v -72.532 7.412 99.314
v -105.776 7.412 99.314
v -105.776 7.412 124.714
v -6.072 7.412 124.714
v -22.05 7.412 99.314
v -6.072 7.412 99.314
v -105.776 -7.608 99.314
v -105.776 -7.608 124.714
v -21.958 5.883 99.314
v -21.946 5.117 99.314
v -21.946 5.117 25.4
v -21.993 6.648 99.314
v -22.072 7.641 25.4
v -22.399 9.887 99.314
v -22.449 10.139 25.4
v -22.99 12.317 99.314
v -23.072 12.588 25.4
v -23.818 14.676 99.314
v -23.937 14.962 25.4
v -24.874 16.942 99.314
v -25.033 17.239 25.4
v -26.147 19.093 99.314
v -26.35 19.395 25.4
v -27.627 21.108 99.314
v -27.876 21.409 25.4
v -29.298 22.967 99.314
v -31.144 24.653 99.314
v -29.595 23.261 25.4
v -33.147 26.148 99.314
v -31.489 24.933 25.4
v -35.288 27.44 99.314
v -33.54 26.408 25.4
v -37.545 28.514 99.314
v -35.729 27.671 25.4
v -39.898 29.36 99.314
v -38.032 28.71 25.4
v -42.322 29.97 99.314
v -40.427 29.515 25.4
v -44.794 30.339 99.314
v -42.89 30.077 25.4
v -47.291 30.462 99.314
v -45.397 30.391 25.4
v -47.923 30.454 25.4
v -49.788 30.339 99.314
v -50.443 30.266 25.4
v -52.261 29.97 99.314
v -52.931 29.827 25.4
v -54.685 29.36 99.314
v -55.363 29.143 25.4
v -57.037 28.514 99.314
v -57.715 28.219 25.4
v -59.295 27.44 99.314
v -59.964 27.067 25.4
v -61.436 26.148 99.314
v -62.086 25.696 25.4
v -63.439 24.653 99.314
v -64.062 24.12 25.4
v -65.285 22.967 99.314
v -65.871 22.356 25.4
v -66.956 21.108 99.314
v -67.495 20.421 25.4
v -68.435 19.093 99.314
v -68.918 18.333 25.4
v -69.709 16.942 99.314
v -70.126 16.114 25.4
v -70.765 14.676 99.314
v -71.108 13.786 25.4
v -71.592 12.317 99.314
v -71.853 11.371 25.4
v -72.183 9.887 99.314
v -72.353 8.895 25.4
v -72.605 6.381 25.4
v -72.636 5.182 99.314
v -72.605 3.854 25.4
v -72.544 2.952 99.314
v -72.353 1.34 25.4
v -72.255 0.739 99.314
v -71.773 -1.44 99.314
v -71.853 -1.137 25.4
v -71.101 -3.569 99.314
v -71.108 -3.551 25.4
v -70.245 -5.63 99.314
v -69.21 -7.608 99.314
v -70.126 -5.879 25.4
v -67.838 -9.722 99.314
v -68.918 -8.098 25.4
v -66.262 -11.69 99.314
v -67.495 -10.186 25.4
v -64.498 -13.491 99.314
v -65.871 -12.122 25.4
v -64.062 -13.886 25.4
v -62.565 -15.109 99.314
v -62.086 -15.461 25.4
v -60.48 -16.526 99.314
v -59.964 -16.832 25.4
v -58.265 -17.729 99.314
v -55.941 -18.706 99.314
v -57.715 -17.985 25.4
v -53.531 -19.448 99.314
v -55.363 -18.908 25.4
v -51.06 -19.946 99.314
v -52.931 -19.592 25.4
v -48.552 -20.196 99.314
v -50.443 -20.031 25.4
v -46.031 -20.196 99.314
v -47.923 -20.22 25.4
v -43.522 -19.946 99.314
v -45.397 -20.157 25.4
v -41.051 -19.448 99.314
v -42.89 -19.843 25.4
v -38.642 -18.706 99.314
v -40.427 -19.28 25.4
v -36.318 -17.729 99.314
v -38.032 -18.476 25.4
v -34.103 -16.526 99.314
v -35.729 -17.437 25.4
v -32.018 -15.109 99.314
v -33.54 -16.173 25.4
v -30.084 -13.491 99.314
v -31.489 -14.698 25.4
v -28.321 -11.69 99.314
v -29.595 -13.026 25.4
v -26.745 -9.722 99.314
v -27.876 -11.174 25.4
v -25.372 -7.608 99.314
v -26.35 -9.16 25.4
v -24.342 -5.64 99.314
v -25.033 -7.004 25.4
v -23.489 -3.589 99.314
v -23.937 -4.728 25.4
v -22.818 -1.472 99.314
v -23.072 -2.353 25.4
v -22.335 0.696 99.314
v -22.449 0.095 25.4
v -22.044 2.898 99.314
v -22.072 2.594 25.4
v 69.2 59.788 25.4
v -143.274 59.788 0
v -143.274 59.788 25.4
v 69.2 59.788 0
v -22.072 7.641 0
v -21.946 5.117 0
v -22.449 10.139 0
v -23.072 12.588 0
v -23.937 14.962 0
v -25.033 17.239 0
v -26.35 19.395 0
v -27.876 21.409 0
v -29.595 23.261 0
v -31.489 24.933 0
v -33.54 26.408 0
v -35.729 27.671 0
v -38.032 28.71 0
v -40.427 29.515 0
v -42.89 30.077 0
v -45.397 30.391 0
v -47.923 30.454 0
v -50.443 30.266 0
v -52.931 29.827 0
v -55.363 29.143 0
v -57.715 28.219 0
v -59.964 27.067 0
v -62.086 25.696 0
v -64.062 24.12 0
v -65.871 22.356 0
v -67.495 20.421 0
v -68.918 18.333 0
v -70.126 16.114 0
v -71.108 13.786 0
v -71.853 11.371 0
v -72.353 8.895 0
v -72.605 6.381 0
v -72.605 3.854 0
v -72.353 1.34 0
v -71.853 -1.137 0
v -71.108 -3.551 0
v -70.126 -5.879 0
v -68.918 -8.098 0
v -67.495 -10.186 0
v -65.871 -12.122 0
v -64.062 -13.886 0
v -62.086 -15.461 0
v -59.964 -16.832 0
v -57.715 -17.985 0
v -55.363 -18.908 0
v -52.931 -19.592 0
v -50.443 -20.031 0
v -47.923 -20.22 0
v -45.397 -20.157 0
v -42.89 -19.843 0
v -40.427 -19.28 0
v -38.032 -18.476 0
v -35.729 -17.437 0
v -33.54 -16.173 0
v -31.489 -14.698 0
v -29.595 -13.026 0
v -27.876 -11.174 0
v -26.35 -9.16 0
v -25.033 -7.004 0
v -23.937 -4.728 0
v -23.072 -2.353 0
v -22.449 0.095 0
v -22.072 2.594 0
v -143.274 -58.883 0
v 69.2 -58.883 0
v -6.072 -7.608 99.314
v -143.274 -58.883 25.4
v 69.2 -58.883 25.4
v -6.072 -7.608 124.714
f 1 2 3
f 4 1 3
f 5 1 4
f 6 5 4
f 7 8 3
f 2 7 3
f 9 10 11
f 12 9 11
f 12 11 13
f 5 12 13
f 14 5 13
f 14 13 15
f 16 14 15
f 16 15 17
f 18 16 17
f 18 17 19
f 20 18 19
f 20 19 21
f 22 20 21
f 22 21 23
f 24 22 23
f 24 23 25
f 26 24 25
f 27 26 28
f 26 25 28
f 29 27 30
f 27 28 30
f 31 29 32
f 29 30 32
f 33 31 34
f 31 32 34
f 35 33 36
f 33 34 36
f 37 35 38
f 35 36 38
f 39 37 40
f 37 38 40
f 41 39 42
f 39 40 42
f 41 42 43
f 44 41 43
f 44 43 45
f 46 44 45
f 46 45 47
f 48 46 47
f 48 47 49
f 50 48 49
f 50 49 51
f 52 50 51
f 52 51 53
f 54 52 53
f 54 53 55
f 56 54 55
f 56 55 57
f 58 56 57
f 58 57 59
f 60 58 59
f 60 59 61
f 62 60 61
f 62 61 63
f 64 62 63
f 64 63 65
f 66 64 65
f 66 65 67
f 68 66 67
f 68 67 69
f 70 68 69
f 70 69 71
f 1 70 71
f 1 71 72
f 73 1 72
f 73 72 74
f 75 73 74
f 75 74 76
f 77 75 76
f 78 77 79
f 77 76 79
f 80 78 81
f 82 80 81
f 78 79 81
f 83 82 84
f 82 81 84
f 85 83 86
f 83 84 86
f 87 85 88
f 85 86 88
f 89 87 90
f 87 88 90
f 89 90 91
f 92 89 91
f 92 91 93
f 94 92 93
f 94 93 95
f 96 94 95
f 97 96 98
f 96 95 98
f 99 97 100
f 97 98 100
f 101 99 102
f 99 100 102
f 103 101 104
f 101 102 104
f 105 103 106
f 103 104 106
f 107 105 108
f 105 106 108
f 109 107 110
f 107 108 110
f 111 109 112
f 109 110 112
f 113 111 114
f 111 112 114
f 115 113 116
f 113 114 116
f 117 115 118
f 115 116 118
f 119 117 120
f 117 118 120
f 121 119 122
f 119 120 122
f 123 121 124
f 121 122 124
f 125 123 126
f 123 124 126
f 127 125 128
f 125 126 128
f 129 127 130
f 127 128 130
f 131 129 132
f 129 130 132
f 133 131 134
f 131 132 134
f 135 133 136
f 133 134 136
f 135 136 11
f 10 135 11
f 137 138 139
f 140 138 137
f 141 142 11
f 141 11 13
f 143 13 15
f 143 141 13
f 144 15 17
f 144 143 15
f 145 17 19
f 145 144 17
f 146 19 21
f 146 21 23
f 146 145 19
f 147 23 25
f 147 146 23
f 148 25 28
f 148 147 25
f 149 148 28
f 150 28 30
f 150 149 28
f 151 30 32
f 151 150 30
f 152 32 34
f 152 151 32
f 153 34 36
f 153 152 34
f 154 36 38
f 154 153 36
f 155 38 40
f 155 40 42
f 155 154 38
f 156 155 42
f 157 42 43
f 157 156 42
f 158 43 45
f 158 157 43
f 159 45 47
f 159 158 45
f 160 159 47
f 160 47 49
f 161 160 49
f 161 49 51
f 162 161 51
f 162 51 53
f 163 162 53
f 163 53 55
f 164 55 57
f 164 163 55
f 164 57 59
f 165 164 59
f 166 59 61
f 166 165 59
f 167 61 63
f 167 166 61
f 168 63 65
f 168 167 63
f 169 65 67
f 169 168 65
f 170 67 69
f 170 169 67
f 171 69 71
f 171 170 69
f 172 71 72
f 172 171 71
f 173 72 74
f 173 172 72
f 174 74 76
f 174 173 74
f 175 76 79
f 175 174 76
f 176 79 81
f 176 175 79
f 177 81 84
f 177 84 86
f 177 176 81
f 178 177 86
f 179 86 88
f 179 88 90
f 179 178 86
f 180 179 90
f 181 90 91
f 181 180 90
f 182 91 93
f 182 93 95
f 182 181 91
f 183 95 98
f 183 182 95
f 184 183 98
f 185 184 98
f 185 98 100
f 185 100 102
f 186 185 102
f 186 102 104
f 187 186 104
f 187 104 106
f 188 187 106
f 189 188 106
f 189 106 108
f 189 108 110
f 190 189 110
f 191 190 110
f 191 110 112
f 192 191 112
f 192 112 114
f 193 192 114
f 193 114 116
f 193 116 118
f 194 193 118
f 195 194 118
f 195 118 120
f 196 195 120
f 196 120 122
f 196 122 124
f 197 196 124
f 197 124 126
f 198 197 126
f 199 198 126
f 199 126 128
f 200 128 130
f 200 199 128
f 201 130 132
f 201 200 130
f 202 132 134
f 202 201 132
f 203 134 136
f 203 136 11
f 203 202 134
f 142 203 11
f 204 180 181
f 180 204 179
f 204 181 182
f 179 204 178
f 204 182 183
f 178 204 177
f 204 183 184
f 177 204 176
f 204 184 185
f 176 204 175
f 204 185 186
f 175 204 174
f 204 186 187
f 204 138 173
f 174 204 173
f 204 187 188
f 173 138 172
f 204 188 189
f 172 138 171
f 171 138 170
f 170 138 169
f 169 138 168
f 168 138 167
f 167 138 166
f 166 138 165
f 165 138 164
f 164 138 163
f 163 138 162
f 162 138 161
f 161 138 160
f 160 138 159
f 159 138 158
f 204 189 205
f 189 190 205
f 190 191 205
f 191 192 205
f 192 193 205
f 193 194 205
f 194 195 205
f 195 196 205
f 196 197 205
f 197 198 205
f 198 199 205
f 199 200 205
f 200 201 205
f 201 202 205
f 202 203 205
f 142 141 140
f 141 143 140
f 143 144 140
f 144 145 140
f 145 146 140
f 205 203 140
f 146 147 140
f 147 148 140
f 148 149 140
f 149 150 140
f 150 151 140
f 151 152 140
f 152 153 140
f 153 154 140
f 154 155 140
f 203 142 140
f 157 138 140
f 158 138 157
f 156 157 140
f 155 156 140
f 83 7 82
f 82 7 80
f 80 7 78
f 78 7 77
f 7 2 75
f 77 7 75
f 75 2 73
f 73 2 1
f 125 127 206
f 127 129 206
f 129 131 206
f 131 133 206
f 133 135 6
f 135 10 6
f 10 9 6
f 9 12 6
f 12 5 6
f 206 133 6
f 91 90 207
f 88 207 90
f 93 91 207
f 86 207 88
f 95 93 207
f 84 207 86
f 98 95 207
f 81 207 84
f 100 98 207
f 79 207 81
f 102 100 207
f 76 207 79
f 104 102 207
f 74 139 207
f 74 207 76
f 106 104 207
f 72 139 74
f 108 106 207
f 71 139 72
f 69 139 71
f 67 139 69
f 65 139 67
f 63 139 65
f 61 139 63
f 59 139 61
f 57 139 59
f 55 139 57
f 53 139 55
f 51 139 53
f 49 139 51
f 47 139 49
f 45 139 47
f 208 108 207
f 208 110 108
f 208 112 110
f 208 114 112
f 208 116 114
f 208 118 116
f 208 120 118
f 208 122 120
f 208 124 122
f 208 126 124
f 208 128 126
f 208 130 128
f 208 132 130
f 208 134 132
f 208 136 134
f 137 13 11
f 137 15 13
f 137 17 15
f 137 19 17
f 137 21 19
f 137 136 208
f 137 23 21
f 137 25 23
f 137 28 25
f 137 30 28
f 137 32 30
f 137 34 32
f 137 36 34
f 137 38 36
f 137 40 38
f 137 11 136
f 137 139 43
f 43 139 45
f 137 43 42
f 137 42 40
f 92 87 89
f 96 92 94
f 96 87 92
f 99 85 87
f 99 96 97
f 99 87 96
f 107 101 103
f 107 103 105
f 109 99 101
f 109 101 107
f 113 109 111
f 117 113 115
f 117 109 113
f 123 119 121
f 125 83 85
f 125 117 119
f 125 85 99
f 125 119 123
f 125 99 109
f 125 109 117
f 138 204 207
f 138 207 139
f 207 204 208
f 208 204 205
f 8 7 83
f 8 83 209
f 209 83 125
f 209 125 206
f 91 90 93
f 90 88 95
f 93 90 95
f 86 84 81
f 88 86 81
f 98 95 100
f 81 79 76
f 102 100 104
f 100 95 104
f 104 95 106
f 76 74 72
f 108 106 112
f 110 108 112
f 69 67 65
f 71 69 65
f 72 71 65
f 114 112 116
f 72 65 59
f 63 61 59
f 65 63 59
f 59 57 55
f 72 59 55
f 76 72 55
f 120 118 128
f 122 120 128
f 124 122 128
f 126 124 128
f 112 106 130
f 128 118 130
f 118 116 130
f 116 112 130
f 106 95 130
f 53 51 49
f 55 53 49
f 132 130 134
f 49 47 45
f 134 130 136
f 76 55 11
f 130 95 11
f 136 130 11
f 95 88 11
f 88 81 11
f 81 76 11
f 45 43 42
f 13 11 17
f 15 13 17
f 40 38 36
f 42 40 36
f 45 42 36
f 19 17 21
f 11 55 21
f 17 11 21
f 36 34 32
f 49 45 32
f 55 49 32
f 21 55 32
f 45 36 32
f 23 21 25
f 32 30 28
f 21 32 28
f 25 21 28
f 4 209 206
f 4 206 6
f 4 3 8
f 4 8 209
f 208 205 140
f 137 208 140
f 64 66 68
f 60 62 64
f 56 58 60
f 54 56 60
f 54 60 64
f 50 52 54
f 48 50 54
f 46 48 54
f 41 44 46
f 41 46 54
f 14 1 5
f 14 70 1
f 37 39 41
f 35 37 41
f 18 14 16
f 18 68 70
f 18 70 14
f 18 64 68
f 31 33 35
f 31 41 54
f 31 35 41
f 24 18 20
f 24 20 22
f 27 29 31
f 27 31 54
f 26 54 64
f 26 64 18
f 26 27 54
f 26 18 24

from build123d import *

# Parameters (mm, degrees)
F0_W     = 212.473422
F0_H     = 118.670951
F0_R     = 25.345002
F1_DEPTH = 25.4
F2_R     = 25.345002
F3_DEPTH = 73.914
F4_W     = 99.704434
F4_H     = 15.019846
F5_DEPTH = 25.4


with BuildPart() as f1:
    # F0 (on Top) → F1 (new body)
    with BuildSketch(Plane.XY):
        with Locations((-37.037164, 0.452341)):
            Rectangle(F0_W, F0_H)
        with Locations((-47.291335, 5.11729)):
            Circle(F0_R, mode=Mode.SUBTRACT)
    extrude(amount=F1_DEPTH)


with BuildPart() as f3:
    # F2 (on face) → F3 (new body)
    with BuildSketch(Plane.XY.offset(25.4)):
        with Locations((-47.291335, 5.11729)):
            Circle(F2_R)
    extrude(amount=F3_DEPTH)

    # F4 (on face) → F5 (join)
    with BuildSketch(Plane.XY.offset(99.314)):
        with Locations((-55.924056, -0.097914)):
            Rectangle(F4_W, F4_H)
    extrude(amount=F5_DEPTH)


solid = Compound([f1.part, f3.part])
